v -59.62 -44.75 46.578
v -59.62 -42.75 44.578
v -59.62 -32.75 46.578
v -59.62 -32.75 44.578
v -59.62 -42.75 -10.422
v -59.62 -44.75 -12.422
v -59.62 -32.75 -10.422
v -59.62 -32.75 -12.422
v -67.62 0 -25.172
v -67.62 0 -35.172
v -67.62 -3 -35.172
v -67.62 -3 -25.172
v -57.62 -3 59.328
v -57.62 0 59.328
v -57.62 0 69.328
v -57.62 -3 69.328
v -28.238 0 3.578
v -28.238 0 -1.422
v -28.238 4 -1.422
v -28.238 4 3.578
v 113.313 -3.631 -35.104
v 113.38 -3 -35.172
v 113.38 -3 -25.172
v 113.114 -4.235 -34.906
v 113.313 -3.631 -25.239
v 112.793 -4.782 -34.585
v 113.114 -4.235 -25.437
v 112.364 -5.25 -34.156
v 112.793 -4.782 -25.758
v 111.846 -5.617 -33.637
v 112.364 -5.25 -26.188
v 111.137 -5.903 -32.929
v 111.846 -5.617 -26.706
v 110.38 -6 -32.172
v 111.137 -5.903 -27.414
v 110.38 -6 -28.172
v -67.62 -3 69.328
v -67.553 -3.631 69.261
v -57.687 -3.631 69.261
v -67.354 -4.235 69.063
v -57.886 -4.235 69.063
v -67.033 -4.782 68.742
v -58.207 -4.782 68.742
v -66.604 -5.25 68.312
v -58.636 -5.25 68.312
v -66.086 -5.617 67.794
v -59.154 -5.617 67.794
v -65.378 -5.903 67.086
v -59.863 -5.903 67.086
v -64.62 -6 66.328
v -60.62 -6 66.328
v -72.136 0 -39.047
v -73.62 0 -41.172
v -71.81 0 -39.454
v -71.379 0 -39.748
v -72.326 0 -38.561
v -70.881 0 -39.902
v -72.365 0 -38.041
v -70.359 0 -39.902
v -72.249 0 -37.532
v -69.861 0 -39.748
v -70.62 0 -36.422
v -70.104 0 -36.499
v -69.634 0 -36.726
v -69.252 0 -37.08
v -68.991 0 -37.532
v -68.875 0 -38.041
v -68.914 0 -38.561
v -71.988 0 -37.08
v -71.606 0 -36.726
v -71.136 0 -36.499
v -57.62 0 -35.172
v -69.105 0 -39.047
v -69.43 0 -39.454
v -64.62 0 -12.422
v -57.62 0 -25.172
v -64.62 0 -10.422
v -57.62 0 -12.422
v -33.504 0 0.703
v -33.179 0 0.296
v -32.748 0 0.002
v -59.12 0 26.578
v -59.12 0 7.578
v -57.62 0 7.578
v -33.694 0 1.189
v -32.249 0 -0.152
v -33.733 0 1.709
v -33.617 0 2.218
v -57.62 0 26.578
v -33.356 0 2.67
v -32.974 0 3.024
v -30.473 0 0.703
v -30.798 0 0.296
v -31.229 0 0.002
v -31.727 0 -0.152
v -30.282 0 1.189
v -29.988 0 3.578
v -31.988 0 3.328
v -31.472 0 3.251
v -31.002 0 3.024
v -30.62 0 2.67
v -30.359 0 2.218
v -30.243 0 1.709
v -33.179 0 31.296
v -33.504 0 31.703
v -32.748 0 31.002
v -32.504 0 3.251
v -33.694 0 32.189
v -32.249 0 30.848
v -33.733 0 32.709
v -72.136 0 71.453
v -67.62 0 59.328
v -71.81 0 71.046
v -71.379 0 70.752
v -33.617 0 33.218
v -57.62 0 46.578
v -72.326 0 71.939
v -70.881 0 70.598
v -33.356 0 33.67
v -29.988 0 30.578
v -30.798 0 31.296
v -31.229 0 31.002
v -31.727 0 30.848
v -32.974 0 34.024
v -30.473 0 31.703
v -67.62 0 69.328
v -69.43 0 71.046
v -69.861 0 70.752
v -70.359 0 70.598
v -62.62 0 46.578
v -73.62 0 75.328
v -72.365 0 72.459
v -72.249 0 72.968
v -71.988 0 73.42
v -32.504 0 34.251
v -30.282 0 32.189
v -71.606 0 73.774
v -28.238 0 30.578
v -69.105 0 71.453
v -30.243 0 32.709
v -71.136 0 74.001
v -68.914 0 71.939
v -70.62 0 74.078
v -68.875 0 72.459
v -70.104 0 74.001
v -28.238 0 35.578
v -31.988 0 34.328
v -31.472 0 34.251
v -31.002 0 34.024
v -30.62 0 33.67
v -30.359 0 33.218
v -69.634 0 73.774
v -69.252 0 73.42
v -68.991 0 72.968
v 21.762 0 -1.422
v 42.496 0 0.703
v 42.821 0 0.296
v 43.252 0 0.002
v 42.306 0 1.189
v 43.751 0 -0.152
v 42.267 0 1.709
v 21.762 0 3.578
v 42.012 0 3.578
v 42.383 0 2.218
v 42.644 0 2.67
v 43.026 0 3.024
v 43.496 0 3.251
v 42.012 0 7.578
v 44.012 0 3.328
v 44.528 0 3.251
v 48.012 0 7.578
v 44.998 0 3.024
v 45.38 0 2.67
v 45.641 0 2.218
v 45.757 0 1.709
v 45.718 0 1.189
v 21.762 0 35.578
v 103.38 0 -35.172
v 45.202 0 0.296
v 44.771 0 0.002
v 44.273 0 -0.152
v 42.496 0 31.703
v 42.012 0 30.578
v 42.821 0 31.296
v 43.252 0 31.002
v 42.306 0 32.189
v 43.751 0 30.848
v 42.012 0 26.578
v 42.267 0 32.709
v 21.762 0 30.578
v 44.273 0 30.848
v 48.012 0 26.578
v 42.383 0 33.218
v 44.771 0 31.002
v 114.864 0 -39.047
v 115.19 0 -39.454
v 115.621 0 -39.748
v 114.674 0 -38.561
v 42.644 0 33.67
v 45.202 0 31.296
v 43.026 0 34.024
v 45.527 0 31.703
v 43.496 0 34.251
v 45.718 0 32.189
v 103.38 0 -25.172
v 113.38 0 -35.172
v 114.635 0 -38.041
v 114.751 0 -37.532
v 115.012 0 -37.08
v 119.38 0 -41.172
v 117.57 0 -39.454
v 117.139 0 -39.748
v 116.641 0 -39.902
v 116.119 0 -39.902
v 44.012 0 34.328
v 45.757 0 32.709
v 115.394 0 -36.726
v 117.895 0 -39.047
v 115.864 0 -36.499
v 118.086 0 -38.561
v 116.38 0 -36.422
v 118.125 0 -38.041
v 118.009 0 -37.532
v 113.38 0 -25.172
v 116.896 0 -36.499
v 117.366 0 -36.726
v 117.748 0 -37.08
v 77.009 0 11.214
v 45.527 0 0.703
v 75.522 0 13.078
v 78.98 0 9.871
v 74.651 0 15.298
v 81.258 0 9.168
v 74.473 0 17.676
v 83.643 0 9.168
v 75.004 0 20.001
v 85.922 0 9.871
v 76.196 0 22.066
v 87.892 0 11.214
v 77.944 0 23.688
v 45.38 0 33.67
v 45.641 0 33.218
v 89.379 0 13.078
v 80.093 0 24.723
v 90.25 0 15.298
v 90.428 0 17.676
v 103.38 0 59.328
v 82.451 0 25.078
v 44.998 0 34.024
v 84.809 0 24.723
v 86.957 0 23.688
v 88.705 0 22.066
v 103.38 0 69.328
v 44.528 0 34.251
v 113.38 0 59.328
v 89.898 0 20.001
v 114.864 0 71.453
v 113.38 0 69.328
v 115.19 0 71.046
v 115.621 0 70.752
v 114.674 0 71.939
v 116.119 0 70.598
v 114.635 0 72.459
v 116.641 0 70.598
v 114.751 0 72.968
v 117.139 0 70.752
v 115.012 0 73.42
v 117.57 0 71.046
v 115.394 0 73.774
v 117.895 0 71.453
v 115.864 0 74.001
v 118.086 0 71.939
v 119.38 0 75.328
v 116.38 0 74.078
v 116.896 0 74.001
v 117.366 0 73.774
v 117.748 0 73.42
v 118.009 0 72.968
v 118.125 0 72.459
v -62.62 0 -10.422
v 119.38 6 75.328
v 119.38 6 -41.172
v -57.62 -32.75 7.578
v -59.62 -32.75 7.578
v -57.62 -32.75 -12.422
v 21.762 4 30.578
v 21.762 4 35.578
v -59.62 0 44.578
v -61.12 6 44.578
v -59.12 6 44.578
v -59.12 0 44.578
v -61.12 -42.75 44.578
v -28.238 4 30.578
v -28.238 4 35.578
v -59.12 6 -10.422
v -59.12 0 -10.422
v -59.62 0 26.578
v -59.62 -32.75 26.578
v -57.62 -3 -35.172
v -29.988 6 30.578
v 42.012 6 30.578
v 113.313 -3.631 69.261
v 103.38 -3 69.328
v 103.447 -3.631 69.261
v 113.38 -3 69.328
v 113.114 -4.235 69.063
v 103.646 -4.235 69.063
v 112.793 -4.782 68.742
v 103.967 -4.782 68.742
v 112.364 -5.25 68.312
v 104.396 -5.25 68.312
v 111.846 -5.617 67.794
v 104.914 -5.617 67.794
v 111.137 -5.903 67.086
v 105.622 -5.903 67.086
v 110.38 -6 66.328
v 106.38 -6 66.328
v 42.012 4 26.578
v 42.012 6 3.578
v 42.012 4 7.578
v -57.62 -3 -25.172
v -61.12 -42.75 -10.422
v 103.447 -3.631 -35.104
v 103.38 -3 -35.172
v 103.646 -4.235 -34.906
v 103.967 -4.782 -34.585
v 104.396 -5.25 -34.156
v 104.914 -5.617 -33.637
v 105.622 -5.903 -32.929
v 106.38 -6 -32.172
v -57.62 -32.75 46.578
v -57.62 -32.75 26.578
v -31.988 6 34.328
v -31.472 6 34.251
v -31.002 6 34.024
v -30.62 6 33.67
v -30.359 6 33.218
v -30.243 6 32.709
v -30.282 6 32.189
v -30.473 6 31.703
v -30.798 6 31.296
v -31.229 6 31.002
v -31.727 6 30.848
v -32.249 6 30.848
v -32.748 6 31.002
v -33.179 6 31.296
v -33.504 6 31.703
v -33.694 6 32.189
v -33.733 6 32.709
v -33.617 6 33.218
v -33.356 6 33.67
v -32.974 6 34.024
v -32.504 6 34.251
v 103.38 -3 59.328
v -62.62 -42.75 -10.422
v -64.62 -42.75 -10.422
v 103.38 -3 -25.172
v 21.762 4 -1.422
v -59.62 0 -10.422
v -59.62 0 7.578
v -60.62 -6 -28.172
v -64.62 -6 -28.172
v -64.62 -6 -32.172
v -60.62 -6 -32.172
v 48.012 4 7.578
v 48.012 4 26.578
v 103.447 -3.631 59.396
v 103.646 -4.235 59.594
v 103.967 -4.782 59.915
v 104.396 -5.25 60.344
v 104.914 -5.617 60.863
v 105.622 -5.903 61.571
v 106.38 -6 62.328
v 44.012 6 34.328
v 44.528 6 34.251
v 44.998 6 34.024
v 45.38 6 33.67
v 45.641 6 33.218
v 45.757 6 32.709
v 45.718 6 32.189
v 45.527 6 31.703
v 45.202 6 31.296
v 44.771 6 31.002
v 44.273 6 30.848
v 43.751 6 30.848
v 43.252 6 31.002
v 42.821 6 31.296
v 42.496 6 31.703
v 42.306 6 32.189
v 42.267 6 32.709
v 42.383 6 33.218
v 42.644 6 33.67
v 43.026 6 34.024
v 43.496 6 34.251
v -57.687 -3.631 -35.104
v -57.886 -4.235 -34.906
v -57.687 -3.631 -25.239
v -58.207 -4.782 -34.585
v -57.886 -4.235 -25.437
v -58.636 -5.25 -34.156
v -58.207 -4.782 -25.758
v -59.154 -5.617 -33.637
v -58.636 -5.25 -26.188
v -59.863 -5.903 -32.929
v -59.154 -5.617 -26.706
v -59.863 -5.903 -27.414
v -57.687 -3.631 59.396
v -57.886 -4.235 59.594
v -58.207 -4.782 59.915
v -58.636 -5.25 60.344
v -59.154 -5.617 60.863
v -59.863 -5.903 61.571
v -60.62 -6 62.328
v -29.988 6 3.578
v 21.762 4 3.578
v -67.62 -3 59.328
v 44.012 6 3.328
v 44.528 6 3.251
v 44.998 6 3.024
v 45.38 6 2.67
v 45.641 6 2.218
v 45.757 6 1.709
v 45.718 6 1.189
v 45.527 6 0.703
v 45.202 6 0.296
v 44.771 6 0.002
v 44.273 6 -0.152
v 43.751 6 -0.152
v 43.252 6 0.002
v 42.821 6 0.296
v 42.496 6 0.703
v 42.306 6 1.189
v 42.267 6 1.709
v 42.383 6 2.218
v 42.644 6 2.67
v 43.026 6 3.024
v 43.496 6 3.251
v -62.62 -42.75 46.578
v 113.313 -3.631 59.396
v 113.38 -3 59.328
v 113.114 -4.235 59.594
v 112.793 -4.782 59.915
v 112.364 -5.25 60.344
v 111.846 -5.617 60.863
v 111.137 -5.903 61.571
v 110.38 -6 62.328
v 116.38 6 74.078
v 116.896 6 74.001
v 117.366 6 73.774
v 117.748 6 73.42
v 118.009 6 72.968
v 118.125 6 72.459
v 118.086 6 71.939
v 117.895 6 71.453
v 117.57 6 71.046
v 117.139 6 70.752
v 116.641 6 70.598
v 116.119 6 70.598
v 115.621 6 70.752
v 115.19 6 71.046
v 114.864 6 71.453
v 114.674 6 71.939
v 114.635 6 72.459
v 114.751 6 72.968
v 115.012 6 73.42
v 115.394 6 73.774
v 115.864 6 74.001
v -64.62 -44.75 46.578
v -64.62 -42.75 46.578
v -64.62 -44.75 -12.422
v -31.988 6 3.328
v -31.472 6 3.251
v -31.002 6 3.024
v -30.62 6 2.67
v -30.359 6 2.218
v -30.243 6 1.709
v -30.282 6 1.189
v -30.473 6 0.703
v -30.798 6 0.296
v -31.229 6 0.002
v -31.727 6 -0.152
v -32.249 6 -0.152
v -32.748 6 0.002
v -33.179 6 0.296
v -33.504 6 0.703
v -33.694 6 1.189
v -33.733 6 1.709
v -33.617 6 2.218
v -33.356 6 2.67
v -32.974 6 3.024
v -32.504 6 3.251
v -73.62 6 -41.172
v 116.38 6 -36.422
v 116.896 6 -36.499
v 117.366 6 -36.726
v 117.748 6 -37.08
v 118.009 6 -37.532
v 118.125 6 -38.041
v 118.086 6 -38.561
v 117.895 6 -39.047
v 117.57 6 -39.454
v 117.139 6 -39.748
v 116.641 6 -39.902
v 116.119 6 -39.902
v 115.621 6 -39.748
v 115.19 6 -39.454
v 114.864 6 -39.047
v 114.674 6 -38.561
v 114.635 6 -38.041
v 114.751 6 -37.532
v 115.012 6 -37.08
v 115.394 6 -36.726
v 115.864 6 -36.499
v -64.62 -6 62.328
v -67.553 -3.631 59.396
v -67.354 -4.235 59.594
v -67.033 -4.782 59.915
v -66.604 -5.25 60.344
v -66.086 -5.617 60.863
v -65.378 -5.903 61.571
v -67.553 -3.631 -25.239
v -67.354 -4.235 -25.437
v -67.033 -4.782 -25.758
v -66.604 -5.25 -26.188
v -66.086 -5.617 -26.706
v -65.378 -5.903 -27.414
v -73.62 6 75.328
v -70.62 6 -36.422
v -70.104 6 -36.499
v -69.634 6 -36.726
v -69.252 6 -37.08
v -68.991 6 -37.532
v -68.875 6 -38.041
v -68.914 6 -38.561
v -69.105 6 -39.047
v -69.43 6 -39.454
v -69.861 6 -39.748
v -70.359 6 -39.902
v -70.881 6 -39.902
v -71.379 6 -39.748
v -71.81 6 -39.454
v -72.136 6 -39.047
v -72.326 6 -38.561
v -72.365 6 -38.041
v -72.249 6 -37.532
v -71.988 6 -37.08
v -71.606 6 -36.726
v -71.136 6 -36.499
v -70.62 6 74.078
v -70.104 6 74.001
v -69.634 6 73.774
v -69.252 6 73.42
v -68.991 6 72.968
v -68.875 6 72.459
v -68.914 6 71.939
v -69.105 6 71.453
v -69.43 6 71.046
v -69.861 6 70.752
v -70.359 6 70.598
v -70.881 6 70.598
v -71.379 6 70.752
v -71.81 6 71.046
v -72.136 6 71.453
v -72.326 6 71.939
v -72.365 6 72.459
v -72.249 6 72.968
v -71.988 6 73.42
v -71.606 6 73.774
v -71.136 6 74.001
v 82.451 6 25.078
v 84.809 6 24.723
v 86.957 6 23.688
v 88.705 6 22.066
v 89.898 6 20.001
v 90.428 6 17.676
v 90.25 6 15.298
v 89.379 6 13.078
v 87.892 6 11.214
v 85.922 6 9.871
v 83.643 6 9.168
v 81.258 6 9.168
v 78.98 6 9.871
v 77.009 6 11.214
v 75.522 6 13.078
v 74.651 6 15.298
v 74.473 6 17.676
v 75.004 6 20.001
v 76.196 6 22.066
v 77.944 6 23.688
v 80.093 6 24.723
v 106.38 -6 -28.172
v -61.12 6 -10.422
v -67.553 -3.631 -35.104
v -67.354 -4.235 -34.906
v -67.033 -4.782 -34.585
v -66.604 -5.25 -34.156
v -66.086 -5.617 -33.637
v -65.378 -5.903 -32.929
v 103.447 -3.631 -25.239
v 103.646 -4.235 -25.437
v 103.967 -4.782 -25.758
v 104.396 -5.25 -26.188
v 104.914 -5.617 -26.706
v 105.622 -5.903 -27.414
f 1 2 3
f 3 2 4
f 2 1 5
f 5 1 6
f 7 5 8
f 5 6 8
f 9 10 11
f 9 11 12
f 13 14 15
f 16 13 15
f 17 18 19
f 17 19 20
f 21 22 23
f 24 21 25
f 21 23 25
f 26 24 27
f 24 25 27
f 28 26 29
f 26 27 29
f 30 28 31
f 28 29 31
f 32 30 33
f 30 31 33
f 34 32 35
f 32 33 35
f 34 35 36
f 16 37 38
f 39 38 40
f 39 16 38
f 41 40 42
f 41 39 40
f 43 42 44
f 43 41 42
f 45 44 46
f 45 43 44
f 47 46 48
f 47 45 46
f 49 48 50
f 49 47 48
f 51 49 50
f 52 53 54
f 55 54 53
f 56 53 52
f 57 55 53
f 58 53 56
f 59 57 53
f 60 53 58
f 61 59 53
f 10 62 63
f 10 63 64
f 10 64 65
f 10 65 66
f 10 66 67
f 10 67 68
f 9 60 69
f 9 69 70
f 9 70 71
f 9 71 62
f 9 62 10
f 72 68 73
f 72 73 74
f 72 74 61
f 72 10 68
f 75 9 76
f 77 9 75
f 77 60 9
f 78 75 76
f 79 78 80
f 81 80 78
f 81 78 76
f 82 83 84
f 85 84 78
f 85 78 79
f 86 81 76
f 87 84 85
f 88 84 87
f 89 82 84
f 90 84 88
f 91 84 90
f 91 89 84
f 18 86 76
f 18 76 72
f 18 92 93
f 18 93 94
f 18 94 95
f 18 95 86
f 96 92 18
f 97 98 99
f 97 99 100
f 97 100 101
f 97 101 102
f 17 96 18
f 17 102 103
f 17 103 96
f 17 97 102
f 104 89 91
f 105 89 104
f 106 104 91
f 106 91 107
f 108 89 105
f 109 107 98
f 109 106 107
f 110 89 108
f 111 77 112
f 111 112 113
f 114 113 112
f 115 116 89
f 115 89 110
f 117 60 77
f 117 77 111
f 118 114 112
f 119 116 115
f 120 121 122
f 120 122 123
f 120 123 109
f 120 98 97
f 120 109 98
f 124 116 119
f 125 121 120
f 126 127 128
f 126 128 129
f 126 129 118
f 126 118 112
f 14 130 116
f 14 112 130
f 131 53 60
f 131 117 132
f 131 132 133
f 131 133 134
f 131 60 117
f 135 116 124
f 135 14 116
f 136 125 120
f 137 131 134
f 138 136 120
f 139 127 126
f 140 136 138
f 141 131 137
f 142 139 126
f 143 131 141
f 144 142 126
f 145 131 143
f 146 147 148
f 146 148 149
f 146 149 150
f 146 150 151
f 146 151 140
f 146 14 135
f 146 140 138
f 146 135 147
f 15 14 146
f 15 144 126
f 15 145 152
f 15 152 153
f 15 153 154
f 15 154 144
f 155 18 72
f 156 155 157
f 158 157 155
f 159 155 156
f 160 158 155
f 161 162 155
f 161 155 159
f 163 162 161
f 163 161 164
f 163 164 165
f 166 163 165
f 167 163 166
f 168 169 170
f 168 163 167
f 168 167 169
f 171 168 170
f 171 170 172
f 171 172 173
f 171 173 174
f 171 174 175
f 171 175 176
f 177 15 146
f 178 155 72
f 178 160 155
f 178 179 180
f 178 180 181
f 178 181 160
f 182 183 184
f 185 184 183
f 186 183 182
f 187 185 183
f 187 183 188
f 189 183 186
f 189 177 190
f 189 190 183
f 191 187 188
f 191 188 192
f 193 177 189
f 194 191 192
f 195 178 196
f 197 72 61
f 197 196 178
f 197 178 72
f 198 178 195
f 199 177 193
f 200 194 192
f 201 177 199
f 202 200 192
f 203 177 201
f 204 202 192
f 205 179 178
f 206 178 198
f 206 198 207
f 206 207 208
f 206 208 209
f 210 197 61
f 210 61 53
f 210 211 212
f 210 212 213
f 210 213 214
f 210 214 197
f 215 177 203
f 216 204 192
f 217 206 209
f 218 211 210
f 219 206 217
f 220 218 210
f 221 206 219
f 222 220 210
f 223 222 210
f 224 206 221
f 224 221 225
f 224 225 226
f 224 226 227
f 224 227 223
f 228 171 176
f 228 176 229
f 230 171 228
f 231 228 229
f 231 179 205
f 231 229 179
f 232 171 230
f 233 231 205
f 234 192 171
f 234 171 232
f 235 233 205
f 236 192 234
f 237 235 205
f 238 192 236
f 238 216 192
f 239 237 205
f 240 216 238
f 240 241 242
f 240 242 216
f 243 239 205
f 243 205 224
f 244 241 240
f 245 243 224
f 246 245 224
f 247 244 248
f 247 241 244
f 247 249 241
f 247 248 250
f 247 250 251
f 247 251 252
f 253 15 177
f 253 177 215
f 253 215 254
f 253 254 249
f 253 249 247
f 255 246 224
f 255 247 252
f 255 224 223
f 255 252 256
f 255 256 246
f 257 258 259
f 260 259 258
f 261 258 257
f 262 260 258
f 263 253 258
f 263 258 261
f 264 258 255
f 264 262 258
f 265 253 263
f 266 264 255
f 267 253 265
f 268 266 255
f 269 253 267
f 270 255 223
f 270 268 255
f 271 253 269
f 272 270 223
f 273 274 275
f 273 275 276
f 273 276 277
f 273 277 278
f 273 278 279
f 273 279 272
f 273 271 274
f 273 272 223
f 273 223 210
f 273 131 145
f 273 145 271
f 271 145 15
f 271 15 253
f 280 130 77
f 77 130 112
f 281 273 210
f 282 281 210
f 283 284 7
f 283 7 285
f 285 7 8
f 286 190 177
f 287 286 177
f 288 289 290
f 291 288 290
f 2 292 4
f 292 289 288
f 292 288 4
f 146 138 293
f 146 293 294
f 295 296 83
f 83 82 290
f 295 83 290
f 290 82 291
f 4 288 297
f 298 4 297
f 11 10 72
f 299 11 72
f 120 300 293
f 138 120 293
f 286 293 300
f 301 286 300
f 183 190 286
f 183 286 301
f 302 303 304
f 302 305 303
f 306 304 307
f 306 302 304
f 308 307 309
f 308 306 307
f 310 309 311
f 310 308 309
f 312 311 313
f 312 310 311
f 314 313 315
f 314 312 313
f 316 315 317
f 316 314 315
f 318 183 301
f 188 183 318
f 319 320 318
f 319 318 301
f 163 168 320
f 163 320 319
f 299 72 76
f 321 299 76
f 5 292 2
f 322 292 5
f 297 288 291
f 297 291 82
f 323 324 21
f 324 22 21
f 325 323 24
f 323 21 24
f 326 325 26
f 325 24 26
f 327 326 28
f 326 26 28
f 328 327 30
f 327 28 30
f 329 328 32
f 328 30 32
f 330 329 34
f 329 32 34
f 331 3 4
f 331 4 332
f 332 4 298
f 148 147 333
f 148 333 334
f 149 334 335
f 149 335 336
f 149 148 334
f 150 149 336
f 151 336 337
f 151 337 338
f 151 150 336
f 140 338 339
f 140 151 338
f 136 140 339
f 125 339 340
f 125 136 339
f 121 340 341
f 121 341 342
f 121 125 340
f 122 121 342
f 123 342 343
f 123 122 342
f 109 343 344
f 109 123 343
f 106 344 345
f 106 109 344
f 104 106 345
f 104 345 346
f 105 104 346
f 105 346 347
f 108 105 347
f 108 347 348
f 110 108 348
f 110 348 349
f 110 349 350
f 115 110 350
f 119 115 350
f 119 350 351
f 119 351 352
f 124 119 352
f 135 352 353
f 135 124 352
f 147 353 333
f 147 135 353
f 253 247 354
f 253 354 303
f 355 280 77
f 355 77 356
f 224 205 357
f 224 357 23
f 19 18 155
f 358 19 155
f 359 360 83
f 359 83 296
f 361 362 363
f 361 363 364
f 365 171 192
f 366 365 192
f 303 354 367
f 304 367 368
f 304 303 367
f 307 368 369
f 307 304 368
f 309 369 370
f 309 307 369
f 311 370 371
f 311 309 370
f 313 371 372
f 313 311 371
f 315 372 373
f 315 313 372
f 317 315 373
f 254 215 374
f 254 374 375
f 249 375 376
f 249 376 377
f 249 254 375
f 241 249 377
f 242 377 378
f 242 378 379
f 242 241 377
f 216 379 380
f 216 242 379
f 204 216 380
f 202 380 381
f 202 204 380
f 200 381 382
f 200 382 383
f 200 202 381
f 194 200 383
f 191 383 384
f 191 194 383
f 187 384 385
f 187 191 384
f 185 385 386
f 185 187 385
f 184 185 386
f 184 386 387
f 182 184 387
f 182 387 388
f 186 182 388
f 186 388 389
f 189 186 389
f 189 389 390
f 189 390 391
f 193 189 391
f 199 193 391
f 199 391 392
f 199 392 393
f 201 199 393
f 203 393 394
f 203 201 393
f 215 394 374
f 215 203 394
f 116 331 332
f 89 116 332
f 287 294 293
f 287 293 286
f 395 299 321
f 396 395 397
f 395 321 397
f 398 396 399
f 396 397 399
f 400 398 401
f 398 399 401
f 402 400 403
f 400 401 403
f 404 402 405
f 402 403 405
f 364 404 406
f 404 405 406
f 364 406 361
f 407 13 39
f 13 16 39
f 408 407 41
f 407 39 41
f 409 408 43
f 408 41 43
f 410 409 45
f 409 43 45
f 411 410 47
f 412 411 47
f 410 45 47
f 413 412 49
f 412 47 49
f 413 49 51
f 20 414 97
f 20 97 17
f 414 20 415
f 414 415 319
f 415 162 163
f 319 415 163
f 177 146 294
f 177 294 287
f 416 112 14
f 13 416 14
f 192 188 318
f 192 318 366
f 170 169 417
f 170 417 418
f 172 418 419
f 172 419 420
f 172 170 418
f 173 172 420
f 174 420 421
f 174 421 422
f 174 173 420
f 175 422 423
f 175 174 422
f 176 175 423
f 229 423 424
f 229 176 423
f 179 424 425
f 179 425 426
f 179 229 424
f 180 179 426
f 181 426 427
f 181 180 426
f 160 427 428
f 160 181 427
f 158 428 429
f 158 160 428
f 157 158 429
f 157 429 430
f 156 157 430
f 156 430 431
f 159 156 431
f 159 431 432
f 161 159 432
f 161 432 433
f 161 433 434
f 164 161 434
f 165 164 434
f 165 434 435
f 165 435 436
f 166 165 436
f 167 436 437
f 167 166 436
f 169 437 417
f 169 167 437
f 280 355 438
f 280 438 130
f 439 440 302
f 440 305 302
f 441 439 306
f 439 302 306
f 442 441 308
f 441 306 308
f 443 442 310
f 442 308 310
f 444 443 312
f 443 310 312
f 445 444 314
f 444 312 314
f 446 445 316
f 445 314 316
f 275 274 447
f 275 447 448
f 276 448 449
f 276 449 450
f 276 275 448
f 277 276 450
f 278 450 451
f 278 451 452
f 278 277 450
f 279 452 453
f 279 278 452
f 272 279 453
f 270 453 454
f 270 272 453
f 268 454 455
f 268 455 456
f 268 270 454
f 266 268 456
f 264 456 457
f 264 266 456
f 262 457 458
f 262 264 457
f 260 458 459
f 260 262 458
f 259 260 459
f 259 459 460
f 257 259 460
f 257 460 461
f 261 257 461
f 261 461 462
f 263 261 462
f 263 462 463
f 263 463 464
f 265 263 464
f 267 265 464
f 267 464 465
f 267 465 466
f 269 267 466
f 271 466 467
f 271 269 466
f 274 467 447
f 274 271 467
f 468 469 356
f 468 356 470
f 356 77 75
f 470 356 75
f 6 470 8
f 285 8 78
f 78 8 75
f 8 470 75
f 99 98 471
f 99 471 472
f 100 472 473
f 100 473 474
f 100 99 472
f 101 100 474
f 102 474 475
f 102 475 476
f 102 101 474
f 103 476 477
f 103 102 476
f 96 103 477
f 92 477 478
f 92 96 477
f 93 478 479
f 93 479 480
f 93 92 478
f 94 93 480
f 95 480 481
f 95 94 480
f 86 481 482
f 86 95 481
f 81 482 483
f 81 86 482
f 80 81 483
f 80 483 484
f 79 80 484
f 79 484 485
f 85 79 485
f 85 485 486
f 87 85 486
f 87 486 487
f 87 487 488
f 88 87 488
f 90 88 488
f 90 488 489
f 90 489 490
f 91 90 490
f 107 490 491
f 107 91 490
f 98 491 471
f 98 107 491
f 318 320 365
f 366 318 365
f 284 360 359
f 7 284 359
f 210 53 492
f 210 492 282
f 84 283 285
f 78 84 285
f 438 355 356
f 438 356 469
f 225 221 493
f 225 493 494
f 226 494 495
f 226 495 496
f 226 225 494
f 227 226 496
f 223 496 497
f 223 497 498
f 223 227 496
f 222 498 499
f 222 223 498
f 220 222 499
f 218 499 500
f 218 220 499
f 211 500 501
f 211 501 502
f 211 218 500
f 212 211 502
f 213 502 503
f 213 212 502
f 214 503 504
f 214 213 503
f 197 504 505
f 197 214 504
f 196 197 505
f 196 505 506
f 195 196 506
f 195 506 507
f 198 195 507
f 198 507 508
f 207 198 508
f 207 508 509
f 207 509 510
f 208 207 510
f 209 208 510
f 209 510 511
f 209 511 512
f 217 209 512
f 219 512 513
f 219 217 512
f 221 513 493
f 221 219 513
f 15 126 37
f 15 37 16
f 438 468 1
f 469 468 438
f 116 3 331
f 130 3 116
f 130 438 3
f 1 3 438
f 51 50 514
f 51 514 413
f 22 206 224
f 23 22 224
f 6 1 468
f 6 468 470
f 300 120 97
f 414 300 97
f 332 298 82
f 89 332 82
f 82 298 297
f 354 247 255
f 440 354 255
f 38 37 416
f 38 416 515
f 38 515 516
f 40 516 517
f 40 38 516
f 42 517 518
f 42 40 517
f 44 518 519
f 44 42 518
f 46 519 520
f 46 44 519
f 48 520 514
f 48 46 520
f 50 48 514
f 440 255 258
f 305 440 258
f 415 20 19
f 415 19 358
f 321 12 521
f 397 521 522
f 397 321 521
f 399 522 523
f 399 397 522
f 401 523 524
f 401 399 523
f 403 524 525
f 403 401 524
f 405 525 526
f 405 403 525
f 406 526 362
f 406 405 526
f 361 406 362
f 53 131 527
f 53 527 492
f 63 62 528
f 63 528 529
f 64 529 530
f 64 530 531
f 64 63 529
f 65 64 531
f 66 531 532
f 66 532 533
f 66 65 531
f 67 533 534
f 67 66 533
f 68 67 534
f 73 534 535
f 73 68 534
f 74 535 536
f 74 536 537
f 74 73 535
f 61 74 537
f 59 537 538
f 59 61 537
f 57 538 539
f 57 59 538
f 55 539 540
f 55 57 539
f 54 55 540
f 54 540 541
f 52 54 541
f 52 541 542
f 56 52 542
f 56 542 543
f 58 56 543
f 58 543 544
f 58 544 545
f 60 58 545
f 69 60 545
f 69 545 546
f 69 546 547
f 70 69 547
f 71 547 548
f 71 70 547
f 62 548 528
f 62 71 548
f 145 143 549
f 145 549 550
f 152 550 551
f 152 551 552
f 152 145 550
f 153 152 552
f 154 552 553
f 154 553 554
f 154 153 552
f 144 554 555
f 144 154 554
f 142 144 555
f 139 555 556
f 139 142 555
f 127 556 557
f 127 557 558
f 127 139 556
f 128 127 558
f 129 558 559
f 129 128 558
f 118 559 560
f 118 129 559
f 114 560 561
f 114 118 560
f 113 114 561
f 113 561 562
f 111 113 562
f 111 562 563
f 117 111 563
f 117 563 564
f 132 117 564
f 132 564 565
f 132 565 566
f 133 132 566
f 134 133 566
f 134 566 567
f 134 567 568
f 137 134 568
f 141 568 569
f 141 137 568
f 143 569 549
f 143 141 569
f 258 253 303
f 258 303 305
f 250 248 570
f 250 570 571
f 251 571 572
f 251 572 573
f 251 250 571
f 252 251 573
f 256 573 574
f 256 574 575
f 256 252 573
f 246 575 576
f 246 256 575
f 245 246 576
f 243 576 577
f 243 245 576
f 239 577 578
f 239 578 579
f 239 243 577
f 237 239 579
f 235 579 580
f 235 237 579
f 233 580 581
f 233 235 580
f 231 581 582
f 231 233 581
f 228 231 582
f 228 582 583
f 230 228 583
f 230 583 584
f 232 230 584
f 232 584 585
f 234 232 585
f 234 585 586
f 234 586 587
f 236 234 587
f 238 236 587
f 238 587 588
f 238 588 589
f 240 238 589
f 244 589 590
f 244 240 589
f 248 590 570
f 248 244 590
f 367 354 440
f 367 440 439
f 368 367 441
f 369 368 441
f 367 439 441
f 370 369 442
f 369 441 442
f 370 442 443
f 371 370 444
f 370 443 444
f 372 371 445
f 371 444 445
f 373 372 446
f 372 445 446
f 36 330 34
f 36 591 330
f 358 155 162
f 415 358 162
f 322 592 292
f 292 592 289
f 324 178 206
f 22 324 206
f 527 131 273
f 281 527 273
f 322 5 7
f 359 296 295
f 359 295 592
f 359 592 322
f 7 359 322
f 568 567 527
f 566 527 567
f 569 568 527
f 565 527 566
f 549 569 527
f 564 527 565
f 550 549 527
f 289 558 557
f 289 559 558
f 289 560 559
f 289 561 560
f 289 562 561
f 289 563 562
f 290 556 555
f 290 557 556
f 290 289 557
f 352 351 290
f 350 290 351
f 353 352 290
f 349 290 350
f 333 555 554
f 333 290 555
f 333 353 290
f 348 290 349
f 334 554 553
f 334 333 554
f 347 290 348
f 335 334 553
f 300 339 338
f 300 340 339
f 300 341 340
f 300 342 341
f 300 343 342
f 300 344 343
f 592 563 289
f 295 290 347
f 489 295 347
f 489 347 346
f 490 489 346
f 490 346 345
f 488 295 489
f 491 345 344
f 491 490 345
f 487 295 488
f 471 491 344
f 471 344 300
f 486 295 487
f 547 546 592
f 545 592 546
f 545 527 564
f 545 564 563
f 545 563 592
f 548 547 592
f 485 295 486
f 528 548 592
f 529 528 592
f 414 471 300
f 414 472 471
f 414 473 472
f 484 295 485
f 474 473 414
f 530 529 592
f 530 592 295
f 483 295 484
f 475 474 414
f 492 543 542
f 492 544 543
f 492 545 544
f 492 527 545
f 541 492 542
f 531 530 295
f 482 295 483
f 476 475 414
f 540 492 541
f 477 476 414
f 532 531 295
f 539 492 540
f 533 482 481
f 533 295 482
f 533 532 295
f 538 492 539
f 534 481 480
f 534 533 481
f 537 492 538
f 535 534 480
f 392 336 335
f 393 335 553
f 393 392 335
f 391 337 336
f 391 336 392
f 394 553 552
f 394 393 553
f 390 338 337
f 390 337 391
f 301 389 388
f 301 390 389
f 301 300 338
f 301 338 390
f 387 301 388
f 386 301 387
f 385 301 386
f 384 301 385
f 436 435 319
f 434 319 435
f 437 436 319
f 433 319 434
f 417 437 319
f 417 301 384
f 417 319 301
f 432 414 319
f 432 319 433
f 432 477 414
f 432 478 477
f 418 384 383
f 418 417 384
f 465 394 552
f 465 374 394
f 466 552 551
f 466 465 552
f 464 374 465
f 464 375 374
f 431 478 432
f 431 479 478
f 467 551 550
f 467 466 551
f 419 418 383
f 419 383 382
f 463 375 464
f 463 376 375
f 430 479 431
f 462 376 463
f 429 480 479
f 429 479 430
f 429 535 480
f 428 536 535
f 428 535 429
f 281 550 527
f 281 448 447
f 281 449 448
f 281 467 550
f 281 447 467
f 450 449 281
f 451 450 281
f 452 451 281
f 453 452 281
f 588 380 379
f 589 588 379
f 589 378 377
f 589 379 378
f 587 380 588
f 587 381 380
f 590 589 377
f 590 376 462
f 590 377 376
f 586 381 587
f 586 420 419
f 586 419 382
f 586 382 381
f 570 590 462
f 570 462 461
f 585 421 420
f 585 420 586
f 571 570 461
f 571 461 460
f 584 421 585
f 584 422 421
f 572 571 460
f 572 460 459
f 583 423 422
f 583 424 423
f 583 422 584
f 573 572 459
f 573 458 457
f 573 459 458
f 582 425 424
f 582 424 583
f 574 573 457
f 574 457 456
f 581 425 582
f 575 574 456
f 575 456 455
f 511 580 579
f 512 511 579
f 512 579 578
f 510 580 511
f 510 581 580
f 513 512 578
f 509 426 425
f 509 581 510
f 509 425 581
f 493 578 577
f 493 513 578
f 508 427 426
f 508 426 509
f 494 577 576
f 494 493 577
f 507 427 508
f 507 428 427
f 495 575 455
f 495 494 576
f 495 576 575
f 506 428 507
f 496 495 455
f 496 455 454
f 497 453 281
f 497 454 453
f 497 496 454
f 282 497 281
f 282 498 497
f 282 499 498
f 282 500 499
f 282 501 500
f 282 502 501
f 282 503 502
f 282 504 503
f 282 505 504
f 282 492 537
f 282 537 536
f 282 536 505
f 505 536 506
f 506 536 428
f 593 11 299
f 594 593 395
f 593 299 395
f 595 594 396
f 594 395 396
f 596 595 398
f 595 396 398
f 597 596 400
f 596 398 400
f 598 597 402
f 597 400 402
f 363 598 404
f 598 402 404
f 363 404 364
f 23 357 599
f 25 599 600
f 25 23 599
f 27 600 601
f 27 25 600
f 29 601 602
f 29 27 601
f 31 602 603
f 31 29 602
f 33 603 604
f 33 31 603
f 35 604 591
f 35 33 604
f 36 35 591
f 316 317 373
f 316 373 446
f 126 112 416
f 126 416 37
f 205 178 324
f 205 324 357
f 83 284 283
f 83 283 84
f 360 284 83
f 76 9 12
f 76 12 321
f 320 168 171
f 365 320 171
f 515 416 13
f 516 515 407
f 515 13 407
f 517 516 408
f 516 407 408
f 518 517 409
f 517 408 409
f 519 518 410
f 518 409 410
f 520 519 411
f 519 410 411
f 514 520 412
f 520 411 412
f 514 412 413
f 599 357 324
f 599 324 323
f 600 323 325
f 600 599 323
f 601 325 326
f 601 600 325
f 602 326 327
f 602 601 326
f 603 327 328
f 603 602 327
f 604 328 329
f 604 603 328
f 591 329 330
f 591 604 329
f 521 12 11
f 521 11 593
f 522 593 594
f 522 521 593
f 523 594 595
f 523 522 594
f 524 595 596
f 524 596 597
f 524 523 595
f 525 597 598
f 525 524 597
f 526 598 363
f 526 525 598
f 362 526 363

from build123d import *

# Parameters (mm, degrees)
SKETCH1_W            = 193
SKETCH1_H            = 116.5
SKETCH1_R            = 1.75
SKETCH1_R_2          = 8
SKETCH1_W_2          = 72
SKETCH1_H_2          = 27
SKETCH1_W_3          = 2
SKETCH1_H_3          = 55
BOSS_EXTRUDE1_DEPTH  = 6
SKETCH3_W            = 10
SKETCH3_H            = 10
BOSS_EXTRUDE3_DEPTH  = 10
SKETCH5_W            = 2
SKETCH5_H            = 55
BOSS_EXTRUDE4_DEPTH  = 6
SKETCH6_W            = 181
SKETCH6_H            = 104.5
CUT_EXTRUDE1_DEPTH   = 4
SKETCH7_W            = 1.5
SKETCH7_H            = 55
BOSS_EXTRUDE5_DEPTH  = 44.75
SKETCH8_W            = 2
SKETCH8_H            = 55
CUT_EXTRUDE2_DEPTH   = 42.25
SKETCH10_W           = 6
SKETCH10_H           = 19
CUT_EXTRUDE3_DEPTH   = 4
FILLET3_R            = 3
SKETCH12_W           = 55
SKETCH12_H           = 2
BOSS_EXTRUDE6_DEPTH  = 1.5
SKETCH14_W           = 3
SKETCH14_H           = 44.75
BOSS_EXTRUDE7_DEPTH  = 2
SKETCH15_W           = 3
SKETCH15_H           = 44.75
BOSS_EXTRUDE8_DEPTH  = 2
BOSS_EXTRUDE9_DEPTH  = 2
SKETCH18_W           = 20
SKETCH18_H           = 32.75
BOSS_EXTRUDE10_DEPTH = 2
SKETCH19_W           = 50
SKETCH19_H           = 37
CUT_EXTRUDE7_DEPTH   = 4


with BuildPart() as part:
    # Sketch1 → Boss-Extrude1 (new body)
    with BuildSketch(Plane(origin=(0, 0, 0), x_dir=(1, 0, 0), z_dir=(0, 1, 0))):
        with Locations((22.87983871, -17.078434096)):
            Rectangle(SKETCH1_W, SKETCH1_H)
        with Locations(Location((-31.988235573, -1.578434096, 0), (0, 0, 270))):
            Circle(SKETCH1_R, mode=Mode.SUBTRACT)
        with Locations(Location((-31.988235573, -32.578434096, 0), (0, 0, 270))):
            Circle(SKETCH1_R, mode=Mode.SUBTRACT)
        with Locations(Location((44.011764427, -1.578434096, 0), (0, 0, 270))):
            Circle(SKETCH1_R, mode=Mode.SUBTRACT)
        with Locations(Location((44.011764427, -32.578434096, 0), (0, 0, 270))):
            Circle(SKETCH1_R, mode=Mode.SUBTRACT)
        with Locations(Location((-70.62016129, -72.328434096, 0), (0, 0, 270))):
            Circle(SKETCH1_R, mode=Mode.SUBTRACT)
        with Locations(Location((-70.62016129, 38.171565904, 0), (0, 0, 270))):
            Circle(SKETCH1_R, mode=Mode.SUBTRACT)
        with Locations(Location((116.37983871, -72.328434096, 0), (0, 0, 270))):
            Circle(SKETCH1_R, mode=Mode.SUBTRACT)
        with Locations(Location((116.37983871, 38.171565904, 0), (0, 0, 270))):
            Circle(SKETCH1_R, mode=Mode.SUBTRACT)
        with Locations(Location((82.450678359, -17.078434096, 0), (0, 0, 270))):
            Circle(SKETCH1_R_2, mode=Mode.SUBTRACT)
        with Locations((6.011764427, -17.078434096)):
            Rectangle(SKETCH1_W_2, SKETCH1_H_2, mode=Mode.SUBTRACT)
        with Locations((-47.331266899, -17.078434096)):
            Rectangle(SKETCH1_W_3, SKETCH1_H_3, mode=Mode.SUBTRACT)
    extrude(amount=BOSS_EXTRUDE1_DEPTH)

    # Sketch3 → Boss-Extrude3 (add)
    with BuildSketch(Plane.XZ):
        with Locations((-62.62016129, 64.328434096)):
            Rectangle(SKETCH3_W, SKETCH3_H)
        with Locations((-62.62016129, -30.171565904)):
            Rectangle(SKETCH3_W, SKETCH3_H)
        with Locations((108.37983871, -30.171565904)):
            Rectangle(SKETCH3_W, SKETCH3_H)
        with Locations((108.37983871, 64.328434096)):
            Rectangle(SKETCH3_W, SKETCH3_H)
    extrude(amount=BOSS_EXTRUDE3_DEPTH)

    # Sketch5 → Boss-Extrude4 (add)
    with BuildSketch(Plane.XZ):
        with Locations((-47.331266899, 17.078434096)):
            Rectangle(SKETCH5_W, SKETCH5_H)
    extrude(amount=-BOSS_EXTRUDE4_DEPTH)

    # Sketch6 → Cut-Extrude1 (cut)
    with BuildSketch(Plane.XZ.offset(10)):
        with Locations((22.87983871, 17.078434096)):
            Rectangle(SKETCH6_W, SKETCH6_H)
    extrude(amount=-CUT_EXTRUDE1_DEPTH, mode=Mode.SUBTRACT)

    # Sketch7 → Boss-Extrude5 (add)
    with BuildSketch(Plane.XZ):
        with Locations((-61.87016129, 17.078434096)):
            Rectangle(SKETCH7_W, SKETCH7_H)
    extrude(amount=BOSS_EXTRUDE5_DEPTH)

    # Sketch8 → Cut-Extrude2 (cut)
    with BuildSketch(Plane.XZ):
        with Locations((-60.12016129, 17.078434096)):
            Rectangle(SKETCH8_W, SKETCH8_H)
    extrude(amount=-CUT_EXTRUDE2_DEPTH, mode=Mode.SUBTRACT)

    # Sketch10 → Cut-Extrude3 (cut)
    with BuildSketch(Plane.XZ):
        with Locations((45.011764427, 17.078434096)):
            Rectangle(SKETCH10_W, SKETCH10_H)
    extrude(amount=-CUT_EXTRUDE3_DEPTH, mode=Mode.SUBTRACT)

    # Fillet3
    fillet3_edges = [part.edges().sort_by_distance(p)[0] for p in [
        (-67.62016129, -6, 64.328434096),
        (-67.62016129, -6, -30.171565904),
        (-62.62016129, -6, -35.171565904),
        (108.37983871, -6, -35.171565904),
        (-62.62016129, -6, 69.328434096),
        (108.37983871, -6, 69.328434096),
        (113.37983871, -6, -30.171565904),
        (113.37983871, -6, 64.328434096),
        (-62.62016129, -6, 59.328434096),
        (-57.62016129, -6, 64.328434096),
        (103.37983871, -6, 64.328434096),
        (108.37983871, -6, 59.328434096),
        (108.37983871, -6, -25.171565904),
        (103.37983871, -6, -30.171565904),
        (-57.62016129, -6, -30.171565904),
        (-62.62016129, -6, -25.171565904),
    ]]
    fillet(fillet3_edges, radius=FILLET3_R)

    # Sketch12 → Boss-Extrude6 (add)
    with BuildSketch(Plane(origin=(-61.12016129, 0, 0), x_dir=(0, 0, -1), z_dir=(1, 0, 0))):
        with Locations((-17.078434096, -43.75)):
            Rectangle(SKETCH12_W, SKETCH12_H)
    extrude(amount=BOSS_EXTRUDE6_DEPTH)

    # Sketch14 → Boss-Extrude7 (add)
    with BuildSketch(Plane(origin=(0, 0, -10.421565904), x_dir=(-1, 0, 0), z_dir=(0, 0, -1))):
        with Locations((61.12016129, -22.375)):
            Rectangle(SKETCH14_W, SKETCH14_H)
    extrude(amount=BOSS_EXTRUDE7_DEPTH)

    # Sketch15 → Boss-Extrude8 (add)
    with BuildSketch(Plane.XY.offset(44.578434096)):
        with Locations((-61.12016129, -22.375)):
            Rectangle(SKETCH15_W, SKETCH15_H)
    extrude(amount=BOSS_EXTRUDE8_DEPTH)

    # Sketch16 → Boss-Extrude9 (add)
    with BuildSketch(Plane.ZY.offset(62.62016129)):
        Polygon((-10.421565904, 0), (-10.421565904, -42.75), (46.578434096, -42.75), (46.578434096, -44.75), (-12.421565904, -44.75), (-12.421565904, 0), align=None)
    extrude(amount=BOSS_EXTRUDE9_DEPTH)

    # Sketch18 → Boss-Extrude10 (add)
    with BuildSketch(Plane(origin=(-59.62016129, 0, 0), x_dir=(0, 0, -1), z_dir=(1, 0, 0))):
        with Locations((-36.578434096, -16.375)):
            Rectangle(SKETCH18_W, SKETCH18_H)
        with Locations((2.421565904, -16.375)):
            Rectangle(SKETCH18_W, SKETCH18_H)
    extrude(amount=BOSS_EXTRUDE10_DEPTH)

    # Sketch19 → Cut-Extrude7 (cut)
    with BuildSketch(Plane.XZ):
        with Locations((-3.238235573, 17.078434096)):
            Rectangle(SKETCH19_W, SKETCH19_H)
    extrude(amount=-CUT_EXTRUDE7_DEPTH, mode=Mode.SUBTRACT)


solid = part.part
